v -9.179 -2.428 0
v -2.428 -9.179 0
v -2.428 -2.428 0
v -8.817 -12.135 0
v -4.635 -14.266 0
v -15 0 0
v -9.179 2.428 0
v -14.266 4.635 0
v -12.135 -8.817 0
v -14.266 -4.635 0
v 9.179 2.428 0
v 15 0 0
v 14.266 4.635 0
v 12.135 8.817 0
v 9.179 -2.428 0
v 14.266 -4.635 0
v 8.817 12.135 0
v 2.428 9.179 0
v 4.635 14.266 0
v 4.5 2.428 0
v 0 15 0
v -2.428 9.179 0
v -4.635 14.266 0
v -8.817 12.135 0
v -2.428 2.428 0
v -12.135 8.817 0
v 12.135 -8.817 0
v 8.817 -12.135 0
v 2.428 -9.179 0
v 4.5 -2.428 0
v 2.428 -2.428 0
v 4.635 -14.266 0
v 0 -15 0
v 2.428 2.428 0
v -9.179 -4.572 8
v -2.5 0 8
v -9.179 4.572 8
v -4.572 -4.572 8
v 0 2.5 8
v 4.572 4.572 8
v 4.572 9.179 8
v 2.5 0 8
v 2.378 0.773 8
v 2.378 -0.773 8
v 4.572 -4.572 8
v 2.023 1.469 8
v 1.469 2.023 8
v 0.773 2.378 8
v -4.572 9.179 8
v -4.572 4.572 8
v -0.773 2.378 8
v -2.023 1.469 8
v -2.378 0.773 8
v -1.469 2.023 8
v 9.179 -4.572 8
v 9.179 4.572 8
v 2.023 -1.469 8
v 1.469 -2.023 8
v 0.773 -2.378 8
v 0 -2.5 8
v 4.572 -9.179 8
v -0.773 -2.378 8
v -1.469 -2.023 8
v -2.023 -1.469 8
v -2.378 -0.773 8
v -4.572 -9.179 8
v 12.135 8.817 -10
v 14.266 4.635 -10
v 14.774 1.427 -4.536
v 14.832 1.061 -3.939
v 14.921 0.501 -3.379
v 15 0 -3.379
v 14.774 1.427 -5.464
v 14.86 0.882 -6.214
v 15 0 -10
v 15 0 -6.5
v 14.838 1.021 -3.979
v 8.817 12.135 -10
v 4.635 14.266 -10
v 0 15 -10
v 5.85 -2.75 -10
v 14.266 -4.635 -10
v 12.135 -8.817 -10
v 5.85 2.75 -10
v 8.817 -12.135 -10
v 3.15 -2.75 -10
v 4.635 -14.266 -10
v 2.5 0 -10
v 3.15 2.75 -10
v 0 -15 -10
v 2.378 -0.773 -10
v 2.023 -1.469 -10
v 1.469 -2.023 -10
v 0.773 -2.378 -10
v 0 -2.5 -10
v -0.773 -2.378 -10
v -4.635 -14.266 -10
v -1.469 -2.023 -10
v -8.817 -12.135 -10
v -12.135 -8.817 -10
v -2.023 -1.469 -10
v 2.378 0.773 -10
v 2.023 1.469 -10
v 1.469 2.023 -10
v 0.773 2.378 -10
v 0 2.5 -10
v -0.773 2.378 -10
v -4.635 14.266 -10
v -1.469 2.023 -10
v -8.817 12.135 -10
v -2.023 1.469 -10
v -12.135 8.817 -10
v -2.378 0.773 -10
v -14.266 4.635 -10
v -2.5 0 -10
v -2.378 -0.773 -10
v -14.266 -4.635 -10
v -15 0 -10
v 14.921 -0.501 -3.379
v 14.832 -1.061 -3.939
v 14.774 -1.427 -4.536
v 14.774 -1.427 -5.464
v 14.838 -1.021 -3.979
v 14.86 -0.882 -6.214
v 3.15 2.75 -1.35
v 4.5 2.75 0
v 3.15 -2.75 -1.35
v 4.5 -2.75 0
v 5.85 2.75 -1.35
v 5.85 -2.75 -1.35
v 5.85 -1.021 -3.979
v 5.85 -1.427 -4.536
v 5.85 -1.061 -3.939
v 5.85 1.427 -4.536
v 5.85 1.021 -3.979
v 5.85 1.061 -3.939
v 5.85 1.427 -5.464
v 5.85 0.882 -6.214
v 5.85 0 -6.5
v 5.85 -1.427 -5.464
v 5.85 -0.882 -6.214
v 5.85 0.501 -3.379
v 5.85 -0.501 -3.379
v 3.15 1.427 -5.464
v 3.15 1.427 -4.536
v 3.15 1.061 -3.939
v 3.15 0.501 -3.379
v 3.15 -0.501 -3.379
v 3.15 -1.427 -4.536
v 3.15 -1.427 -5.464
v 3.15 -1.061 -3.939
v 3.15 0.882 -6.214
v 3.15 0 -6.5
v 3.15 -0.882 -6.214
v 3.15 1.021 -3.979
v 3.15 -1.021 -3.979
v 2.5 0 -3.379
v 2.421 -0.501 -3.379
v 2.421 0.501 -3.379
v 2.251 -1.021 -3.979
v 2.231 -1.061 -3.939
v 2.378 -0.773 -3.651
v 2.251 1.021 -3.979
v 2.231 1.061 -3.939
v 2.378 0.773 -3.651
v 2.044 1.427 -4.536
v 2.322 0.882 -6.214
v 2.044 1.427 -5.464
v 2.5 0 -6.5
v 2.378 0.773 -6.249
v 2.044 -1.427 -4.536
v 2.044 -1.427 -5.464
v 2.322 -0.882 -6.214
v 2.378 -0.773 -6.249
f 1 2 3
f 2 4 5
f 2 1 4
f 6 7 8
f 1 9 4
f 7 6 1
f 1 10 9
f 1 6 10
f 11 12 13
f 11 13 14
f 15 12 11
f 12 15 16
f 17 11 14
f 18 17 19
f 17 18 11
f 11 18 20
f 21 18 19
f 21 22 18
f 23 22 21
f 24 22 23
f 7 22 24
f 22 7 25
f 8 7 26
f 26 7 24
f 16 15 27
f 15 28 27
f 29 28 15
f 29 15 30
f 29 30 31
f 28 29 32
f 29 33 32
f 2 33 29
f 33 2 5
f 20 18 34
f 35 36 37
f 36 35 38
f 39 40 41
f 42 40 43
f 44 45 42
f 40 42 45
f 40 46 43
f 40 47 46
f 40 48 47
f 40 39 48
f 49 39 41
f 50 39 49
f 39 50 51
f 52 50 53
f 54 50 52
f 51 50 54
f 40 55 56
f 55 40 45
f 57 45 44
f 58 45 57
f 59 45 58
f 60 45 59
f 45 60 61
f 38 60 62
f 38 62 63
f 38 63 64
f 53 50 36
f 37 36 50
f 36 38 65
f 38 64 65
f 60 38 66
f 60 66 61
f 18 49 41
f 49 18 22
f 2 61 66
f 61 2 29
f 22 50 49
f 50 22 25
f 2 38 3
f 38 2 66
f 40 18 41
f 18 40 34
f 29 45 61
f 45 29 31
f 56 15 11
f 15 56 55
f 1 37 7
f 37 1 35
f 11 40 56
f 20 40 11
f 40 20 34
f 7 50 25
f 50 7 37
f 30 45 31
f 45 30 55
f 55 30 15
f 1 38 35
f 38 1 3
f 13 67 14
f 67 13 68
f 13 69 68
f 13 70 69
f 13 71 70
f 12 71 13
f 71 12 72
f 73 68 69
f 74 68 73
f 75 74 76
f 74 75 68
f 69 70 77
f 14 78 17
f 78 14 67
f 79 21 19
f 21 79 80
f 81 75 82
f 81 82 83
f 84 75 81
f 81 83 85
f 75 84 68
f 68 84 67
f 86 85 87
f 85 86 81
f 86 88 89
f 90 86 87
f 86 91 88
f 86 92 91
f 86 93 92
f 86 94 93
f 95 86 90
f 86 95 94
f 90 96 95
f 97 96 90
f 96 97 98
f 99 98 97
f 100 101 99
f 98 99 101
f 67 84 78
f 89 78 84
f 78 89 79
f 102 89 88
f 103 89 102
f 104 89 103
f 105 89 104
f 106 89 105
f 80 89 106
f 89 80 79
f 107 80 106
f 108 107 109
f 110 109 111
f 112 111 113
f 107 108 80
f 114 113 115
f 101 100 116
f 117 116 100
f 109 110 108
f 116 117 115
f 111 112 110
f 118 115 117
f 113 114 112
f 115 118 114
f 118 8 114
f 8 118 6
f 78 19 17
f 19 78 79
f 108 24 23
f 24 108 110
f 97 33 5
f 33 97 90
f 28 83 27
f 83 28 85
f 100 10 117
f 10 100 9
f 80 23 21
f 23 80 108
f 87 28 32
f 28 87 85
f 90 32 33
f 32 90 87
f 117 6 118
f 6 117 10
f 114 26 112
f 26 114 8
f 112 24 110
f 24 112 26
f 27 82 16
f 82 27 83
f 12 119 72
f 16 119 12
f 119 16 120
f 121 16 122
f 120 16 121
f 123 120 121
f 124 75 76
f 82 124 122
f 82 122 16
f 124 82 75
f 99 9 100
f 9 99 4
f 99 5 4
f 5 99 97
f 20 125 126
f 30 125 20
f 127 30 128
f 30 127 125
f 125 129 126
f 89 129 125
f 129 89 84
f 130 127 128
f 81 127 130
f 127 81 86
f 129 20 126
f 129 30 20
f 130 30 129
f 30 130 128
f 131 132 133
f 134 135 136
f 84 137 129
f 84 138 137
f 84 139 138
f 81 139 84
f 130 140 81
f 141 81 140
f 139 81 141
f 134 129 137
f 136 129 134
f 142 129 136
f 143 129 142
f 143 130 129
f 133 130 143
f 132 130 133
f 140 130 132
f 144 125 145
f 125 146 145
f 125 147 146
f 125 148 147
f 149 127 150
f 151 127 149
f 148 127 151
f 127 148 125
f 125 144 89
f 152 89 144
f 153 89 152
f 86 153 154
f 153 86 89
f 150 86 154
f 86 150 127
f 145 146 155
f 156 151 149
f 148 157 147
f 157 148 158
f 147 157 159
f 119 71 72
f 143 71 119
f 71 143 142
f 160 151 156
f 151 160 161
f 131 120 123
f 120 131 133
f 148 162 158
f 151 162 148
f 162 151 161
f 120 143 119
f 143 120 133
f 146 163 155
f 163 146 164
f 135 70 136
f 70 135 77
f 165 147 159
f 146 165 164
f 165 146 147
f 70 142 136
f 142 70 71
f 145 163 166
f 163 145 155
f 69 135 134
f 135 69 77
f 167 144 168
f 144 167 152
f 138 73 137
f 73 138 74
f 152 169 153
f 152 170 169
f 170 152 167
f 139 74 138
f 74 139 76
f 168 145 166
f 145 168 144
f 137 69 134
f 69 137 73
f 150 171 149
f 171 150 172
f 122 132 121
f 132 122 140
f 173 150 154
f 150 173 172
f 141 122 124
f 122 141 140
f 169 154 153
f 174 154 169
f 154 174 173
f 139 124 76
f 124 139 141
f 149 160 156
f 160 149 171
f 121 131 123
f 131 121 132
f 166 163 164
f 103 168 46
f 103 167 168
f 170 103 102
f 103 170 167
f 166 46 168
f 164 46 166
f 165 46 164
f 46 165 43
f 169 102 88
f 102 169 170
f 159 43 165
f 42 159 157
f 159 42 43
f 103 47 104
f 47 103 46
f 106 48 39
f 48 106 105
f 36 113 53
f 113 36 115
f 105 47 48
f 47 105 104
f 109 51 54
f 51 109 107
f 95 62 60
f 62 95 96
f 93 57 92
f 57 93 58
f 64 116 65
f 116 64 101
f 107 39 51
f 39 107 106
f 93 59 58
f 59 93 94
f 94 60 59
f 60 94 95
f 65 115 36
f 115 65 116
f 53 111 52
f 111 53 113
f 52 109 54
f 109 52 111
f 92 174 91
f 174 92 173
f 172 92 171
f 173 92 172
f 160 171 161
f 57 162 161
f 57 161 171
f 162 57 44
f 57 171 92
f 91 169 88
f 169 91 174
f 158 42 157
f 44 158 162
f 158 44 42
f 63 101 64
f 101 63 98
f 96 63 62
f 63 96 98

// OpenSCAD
screwsize=3;
pi = 3.1415926;

// Make a cuboid with a 45 degree top for vertical slots etc

module cen_hat(size)
{
	translate([0, 0, size.x/sqrt(2)])
		union()
		{
			rotate([0, 45, 0])
				cube([size.x, size.y, 5*max(size.x, max(size.y, size.z))], center=true);
			rotate([0, -45, 0])
				cube([size.x, size.y, 5*max(size.x, max(size.y, size.z))], center=true);
		}
}

module hat_cube(size = [1,1,1], center = false)
{
	difference()
	{
		cube(size, center);
		if(center)
			translate([0, 0, size.z/2])
				cen_hat(size);
		else
			translate([size.x/2, size.y/2, size.z])
				cen_hat(size);
	}
}

// Make a RepRap teardrop with its axis along Z
// If truncated is true, chop the apex; if not, come to a point

// I stole this function from Erik...

// If teardrop_angle is negative, this just gives an ordinary cylinder.  If it is zero or positive, the 
// teardrop is rotated through that angle.  Other arguments are as for the standard cylinder function.

module teardrop_internal(r=1.5, h=20, teardrop_angle=-1, truncateMM=0.5)
{
	if(teardrop_angle < 0)
		cylinder(r=r, h=h, center=false, $fn=max(2*r, 10));
	 else
		rotate([0, 0, teardrop_angle])
			union()
			{
				if(truncateMM > 0)
				{
					intersection()
					{
						translate([truncateMM,0,h/2]) 
							scale([1,1,h])
								cube([r*2.8275,r*2,1],center=true);
						scale([1,1,h]) 
								rotate([0,0,3*45])
									cube([r,r,1]);
					}
				} else
				{
					scale([1,1,h])
						rotate([0,0,3*45])
							cube([r,r,1]);
				}
				cylinder(r=r, h = h, center=false, $fn=max(2*r, 10));
		}
}

module teardrop(r=1.5, h=20, center=false, teardrop_angle=-1, truncateMM=0.5)
{
	if(center)
		translate([0, 0, -h/2])
			teardrop_internal(r=r, h=h, teardrop_angle=teardrop_angle, truncateMM=truncateMM);
	else
		teardrop_internal(r=r, h=h, teardrop_angle=teardrop_angle, truncateMM=truncateMM);
}



module tooth_gap(height = 10, number_of_teeth = 11, inner_radius = 10, dr = 3,  angle=7)
{
	linear_extrude(height = 2*height, center = true, convexity = 10, twist = 0)
		polygon( points = [
			[pi*inner_radius/(2*number_of_teeth), 0],
			[-pi*inner_radius/(2*number_of_teeth), 0],
			[-2*dr *sin(angle) - pi*inner_radius/(2*number_of_teeth), 2*dr],
			[2*dr *sin(angle) + pi*inner_radius/(2*number_of_teeth), 2*dr],
		], convexity = 3);
}

module trapezium(s=[1,2,3], center = false, angle = 10)
{
	difference()
	{
		cube([s.x + 1.1*s.z*tan(angle), s.y + 1.1*s.z*tan(angle), s.z], center=true);
		translate([s.x/2 + s.x/(2*cos(angle)),0,0])
			rotate([0,-angle,0])
				cube([s.x,3*s.y,3*s.z], center=true);
		translate([-s.x/2 - s.x/(2*cos(angle)),0,0])
			rotate([0,angle,0])
				cube([s.x,3*s.y,3*s.z], center=true);
		/*translate([0, s.y/2 + s.y/(2*cos(angle)),0])
			rotate([angle,0,0])
				cube([3*s.x,s.y,3*s.z], center=true);
		translate([0, -s.y/2 - s.y/(2*cos(angle)),0])
			rotate([-angle,0,0])
				cube([3*s.x,s.y,3*s.z], center=true);*/
	}
}


module key(height = 10,  inner_radius = 10, outer_radius = 12, angle=15)
{
	union()
	{
		trapezium([2*inner_radius, 2*outer_radius, height], center = true, angle = angle);
		rotate([0,0,90])
			trapezium([2*inner_radius, 2*outer_radius, height], center = true, angle = angle);
		//rotate([0,0,45])
			//trapezium([(5*inner_radius + 3*outer_radius)/4, (5*inner_radius + 3*outer_radius)/4, height], center = true, angle = angle);
	}
}

module flexi_male(hub_height=7.5, hub_radius = 9.5, shaft_radius = 2.5, height =13, inner_radius = 4.5, outer_radius = 6.5, angle=40)
{
	difference()
	{
		union()
		{
			translate([0,0,height/2])
				rotate([0,180,0])
					key(height =height, inner_radius = inner_radius, 
						outer_radius = outer_radius, angle=angle);
			translate([0,0,-hub_height/2])
				cylinder(h = hub_height, r = hub_radius,center=true,$fn=20);
		}
		
		cylinder(h = 30, r = shaft_radius, center=true,$fn=20);
		
		translate([shaft_radius + 2, 0, -hub_height/2])
			hat_cube([2.7,5.5,hub_height], center=true);
		translate([0,0,-hub_height/2])
			rotate([0,90,0])
				if(hub_radius >= outer_radius)
					teardrop(h = 2*hub_radius, r = screwsize/2, center=false, teardrop_angle=0, truncateMM=0.5);
				else
					rotate([0,0,180])
						teardrop(h = 2*hub_radius, r = screwsize/2, center=false, teardrop_angle=0, truncateMM=0.5);
	}
}

module flexi_female(hub_height=7.5, hub_radius = 9.5, shaft_radius = 2.5, height =13, inner_radius = 4.5, outer_radius = 6.5, angle=40)
{
	difference()
	{
		difference()
		{
			translate([0,0,-hub_height])
				cylinder(h = hub_height+height-0.25, r = hub_radius,$fn=20);
			translate([0,0,height/2])
					key(height =height, inner_radius = inner_radius, 
						outer_radius = outer_radius, angle=angle);
		}
		
		cylinder(h = 30, r = shaft_radius, center=true,$fn=20);
		
		translate([shaft_radius + 2, 0, -hub_height/2])
			hat_cube([2.7,5.5,hub_height], center=true);
		translate([0,0,-hub_height/2])
			rotate([0,90,0])
				if(hub_radius >= outer_radius)
					teardrop(h = 2*hub_radius, r = screwsize/2, center=false, teardrop_angle=0, truncateMM=0.5);
				else
					rotate([0,0,180])
						teardrop(h = 2*hub_radius, r = screwsize/2, center=false, teardrop_angle=0, truncateMM=0.5);
	}
}

module insert(height=10, inner_radius=2.5, outer_radius=4)
{
	difference()
	{
		cylinder(h = height, r = outer_radius,center=true,$fn=20);
		cylinder(h = height+3, r = inner_radius,center=true,$fn=20);
	}
}


//translate([0,0,30])
//rotate([0,180,0])
flexi_male(hub_height=10, hub_radius = 15, shaft_radius = 2.5, height =8, inner_radius = 3.5, outer_radius = 8, angle=15);

//flexi_female(hub_height=10, hub_radius = 15, shaft_radius = 4, height =10, inner_radius = 6, outer_radius = 9.5, angle=15);


//insert(height=10, inner_radius=2.5, outer_radius=4);


//trapezium();
